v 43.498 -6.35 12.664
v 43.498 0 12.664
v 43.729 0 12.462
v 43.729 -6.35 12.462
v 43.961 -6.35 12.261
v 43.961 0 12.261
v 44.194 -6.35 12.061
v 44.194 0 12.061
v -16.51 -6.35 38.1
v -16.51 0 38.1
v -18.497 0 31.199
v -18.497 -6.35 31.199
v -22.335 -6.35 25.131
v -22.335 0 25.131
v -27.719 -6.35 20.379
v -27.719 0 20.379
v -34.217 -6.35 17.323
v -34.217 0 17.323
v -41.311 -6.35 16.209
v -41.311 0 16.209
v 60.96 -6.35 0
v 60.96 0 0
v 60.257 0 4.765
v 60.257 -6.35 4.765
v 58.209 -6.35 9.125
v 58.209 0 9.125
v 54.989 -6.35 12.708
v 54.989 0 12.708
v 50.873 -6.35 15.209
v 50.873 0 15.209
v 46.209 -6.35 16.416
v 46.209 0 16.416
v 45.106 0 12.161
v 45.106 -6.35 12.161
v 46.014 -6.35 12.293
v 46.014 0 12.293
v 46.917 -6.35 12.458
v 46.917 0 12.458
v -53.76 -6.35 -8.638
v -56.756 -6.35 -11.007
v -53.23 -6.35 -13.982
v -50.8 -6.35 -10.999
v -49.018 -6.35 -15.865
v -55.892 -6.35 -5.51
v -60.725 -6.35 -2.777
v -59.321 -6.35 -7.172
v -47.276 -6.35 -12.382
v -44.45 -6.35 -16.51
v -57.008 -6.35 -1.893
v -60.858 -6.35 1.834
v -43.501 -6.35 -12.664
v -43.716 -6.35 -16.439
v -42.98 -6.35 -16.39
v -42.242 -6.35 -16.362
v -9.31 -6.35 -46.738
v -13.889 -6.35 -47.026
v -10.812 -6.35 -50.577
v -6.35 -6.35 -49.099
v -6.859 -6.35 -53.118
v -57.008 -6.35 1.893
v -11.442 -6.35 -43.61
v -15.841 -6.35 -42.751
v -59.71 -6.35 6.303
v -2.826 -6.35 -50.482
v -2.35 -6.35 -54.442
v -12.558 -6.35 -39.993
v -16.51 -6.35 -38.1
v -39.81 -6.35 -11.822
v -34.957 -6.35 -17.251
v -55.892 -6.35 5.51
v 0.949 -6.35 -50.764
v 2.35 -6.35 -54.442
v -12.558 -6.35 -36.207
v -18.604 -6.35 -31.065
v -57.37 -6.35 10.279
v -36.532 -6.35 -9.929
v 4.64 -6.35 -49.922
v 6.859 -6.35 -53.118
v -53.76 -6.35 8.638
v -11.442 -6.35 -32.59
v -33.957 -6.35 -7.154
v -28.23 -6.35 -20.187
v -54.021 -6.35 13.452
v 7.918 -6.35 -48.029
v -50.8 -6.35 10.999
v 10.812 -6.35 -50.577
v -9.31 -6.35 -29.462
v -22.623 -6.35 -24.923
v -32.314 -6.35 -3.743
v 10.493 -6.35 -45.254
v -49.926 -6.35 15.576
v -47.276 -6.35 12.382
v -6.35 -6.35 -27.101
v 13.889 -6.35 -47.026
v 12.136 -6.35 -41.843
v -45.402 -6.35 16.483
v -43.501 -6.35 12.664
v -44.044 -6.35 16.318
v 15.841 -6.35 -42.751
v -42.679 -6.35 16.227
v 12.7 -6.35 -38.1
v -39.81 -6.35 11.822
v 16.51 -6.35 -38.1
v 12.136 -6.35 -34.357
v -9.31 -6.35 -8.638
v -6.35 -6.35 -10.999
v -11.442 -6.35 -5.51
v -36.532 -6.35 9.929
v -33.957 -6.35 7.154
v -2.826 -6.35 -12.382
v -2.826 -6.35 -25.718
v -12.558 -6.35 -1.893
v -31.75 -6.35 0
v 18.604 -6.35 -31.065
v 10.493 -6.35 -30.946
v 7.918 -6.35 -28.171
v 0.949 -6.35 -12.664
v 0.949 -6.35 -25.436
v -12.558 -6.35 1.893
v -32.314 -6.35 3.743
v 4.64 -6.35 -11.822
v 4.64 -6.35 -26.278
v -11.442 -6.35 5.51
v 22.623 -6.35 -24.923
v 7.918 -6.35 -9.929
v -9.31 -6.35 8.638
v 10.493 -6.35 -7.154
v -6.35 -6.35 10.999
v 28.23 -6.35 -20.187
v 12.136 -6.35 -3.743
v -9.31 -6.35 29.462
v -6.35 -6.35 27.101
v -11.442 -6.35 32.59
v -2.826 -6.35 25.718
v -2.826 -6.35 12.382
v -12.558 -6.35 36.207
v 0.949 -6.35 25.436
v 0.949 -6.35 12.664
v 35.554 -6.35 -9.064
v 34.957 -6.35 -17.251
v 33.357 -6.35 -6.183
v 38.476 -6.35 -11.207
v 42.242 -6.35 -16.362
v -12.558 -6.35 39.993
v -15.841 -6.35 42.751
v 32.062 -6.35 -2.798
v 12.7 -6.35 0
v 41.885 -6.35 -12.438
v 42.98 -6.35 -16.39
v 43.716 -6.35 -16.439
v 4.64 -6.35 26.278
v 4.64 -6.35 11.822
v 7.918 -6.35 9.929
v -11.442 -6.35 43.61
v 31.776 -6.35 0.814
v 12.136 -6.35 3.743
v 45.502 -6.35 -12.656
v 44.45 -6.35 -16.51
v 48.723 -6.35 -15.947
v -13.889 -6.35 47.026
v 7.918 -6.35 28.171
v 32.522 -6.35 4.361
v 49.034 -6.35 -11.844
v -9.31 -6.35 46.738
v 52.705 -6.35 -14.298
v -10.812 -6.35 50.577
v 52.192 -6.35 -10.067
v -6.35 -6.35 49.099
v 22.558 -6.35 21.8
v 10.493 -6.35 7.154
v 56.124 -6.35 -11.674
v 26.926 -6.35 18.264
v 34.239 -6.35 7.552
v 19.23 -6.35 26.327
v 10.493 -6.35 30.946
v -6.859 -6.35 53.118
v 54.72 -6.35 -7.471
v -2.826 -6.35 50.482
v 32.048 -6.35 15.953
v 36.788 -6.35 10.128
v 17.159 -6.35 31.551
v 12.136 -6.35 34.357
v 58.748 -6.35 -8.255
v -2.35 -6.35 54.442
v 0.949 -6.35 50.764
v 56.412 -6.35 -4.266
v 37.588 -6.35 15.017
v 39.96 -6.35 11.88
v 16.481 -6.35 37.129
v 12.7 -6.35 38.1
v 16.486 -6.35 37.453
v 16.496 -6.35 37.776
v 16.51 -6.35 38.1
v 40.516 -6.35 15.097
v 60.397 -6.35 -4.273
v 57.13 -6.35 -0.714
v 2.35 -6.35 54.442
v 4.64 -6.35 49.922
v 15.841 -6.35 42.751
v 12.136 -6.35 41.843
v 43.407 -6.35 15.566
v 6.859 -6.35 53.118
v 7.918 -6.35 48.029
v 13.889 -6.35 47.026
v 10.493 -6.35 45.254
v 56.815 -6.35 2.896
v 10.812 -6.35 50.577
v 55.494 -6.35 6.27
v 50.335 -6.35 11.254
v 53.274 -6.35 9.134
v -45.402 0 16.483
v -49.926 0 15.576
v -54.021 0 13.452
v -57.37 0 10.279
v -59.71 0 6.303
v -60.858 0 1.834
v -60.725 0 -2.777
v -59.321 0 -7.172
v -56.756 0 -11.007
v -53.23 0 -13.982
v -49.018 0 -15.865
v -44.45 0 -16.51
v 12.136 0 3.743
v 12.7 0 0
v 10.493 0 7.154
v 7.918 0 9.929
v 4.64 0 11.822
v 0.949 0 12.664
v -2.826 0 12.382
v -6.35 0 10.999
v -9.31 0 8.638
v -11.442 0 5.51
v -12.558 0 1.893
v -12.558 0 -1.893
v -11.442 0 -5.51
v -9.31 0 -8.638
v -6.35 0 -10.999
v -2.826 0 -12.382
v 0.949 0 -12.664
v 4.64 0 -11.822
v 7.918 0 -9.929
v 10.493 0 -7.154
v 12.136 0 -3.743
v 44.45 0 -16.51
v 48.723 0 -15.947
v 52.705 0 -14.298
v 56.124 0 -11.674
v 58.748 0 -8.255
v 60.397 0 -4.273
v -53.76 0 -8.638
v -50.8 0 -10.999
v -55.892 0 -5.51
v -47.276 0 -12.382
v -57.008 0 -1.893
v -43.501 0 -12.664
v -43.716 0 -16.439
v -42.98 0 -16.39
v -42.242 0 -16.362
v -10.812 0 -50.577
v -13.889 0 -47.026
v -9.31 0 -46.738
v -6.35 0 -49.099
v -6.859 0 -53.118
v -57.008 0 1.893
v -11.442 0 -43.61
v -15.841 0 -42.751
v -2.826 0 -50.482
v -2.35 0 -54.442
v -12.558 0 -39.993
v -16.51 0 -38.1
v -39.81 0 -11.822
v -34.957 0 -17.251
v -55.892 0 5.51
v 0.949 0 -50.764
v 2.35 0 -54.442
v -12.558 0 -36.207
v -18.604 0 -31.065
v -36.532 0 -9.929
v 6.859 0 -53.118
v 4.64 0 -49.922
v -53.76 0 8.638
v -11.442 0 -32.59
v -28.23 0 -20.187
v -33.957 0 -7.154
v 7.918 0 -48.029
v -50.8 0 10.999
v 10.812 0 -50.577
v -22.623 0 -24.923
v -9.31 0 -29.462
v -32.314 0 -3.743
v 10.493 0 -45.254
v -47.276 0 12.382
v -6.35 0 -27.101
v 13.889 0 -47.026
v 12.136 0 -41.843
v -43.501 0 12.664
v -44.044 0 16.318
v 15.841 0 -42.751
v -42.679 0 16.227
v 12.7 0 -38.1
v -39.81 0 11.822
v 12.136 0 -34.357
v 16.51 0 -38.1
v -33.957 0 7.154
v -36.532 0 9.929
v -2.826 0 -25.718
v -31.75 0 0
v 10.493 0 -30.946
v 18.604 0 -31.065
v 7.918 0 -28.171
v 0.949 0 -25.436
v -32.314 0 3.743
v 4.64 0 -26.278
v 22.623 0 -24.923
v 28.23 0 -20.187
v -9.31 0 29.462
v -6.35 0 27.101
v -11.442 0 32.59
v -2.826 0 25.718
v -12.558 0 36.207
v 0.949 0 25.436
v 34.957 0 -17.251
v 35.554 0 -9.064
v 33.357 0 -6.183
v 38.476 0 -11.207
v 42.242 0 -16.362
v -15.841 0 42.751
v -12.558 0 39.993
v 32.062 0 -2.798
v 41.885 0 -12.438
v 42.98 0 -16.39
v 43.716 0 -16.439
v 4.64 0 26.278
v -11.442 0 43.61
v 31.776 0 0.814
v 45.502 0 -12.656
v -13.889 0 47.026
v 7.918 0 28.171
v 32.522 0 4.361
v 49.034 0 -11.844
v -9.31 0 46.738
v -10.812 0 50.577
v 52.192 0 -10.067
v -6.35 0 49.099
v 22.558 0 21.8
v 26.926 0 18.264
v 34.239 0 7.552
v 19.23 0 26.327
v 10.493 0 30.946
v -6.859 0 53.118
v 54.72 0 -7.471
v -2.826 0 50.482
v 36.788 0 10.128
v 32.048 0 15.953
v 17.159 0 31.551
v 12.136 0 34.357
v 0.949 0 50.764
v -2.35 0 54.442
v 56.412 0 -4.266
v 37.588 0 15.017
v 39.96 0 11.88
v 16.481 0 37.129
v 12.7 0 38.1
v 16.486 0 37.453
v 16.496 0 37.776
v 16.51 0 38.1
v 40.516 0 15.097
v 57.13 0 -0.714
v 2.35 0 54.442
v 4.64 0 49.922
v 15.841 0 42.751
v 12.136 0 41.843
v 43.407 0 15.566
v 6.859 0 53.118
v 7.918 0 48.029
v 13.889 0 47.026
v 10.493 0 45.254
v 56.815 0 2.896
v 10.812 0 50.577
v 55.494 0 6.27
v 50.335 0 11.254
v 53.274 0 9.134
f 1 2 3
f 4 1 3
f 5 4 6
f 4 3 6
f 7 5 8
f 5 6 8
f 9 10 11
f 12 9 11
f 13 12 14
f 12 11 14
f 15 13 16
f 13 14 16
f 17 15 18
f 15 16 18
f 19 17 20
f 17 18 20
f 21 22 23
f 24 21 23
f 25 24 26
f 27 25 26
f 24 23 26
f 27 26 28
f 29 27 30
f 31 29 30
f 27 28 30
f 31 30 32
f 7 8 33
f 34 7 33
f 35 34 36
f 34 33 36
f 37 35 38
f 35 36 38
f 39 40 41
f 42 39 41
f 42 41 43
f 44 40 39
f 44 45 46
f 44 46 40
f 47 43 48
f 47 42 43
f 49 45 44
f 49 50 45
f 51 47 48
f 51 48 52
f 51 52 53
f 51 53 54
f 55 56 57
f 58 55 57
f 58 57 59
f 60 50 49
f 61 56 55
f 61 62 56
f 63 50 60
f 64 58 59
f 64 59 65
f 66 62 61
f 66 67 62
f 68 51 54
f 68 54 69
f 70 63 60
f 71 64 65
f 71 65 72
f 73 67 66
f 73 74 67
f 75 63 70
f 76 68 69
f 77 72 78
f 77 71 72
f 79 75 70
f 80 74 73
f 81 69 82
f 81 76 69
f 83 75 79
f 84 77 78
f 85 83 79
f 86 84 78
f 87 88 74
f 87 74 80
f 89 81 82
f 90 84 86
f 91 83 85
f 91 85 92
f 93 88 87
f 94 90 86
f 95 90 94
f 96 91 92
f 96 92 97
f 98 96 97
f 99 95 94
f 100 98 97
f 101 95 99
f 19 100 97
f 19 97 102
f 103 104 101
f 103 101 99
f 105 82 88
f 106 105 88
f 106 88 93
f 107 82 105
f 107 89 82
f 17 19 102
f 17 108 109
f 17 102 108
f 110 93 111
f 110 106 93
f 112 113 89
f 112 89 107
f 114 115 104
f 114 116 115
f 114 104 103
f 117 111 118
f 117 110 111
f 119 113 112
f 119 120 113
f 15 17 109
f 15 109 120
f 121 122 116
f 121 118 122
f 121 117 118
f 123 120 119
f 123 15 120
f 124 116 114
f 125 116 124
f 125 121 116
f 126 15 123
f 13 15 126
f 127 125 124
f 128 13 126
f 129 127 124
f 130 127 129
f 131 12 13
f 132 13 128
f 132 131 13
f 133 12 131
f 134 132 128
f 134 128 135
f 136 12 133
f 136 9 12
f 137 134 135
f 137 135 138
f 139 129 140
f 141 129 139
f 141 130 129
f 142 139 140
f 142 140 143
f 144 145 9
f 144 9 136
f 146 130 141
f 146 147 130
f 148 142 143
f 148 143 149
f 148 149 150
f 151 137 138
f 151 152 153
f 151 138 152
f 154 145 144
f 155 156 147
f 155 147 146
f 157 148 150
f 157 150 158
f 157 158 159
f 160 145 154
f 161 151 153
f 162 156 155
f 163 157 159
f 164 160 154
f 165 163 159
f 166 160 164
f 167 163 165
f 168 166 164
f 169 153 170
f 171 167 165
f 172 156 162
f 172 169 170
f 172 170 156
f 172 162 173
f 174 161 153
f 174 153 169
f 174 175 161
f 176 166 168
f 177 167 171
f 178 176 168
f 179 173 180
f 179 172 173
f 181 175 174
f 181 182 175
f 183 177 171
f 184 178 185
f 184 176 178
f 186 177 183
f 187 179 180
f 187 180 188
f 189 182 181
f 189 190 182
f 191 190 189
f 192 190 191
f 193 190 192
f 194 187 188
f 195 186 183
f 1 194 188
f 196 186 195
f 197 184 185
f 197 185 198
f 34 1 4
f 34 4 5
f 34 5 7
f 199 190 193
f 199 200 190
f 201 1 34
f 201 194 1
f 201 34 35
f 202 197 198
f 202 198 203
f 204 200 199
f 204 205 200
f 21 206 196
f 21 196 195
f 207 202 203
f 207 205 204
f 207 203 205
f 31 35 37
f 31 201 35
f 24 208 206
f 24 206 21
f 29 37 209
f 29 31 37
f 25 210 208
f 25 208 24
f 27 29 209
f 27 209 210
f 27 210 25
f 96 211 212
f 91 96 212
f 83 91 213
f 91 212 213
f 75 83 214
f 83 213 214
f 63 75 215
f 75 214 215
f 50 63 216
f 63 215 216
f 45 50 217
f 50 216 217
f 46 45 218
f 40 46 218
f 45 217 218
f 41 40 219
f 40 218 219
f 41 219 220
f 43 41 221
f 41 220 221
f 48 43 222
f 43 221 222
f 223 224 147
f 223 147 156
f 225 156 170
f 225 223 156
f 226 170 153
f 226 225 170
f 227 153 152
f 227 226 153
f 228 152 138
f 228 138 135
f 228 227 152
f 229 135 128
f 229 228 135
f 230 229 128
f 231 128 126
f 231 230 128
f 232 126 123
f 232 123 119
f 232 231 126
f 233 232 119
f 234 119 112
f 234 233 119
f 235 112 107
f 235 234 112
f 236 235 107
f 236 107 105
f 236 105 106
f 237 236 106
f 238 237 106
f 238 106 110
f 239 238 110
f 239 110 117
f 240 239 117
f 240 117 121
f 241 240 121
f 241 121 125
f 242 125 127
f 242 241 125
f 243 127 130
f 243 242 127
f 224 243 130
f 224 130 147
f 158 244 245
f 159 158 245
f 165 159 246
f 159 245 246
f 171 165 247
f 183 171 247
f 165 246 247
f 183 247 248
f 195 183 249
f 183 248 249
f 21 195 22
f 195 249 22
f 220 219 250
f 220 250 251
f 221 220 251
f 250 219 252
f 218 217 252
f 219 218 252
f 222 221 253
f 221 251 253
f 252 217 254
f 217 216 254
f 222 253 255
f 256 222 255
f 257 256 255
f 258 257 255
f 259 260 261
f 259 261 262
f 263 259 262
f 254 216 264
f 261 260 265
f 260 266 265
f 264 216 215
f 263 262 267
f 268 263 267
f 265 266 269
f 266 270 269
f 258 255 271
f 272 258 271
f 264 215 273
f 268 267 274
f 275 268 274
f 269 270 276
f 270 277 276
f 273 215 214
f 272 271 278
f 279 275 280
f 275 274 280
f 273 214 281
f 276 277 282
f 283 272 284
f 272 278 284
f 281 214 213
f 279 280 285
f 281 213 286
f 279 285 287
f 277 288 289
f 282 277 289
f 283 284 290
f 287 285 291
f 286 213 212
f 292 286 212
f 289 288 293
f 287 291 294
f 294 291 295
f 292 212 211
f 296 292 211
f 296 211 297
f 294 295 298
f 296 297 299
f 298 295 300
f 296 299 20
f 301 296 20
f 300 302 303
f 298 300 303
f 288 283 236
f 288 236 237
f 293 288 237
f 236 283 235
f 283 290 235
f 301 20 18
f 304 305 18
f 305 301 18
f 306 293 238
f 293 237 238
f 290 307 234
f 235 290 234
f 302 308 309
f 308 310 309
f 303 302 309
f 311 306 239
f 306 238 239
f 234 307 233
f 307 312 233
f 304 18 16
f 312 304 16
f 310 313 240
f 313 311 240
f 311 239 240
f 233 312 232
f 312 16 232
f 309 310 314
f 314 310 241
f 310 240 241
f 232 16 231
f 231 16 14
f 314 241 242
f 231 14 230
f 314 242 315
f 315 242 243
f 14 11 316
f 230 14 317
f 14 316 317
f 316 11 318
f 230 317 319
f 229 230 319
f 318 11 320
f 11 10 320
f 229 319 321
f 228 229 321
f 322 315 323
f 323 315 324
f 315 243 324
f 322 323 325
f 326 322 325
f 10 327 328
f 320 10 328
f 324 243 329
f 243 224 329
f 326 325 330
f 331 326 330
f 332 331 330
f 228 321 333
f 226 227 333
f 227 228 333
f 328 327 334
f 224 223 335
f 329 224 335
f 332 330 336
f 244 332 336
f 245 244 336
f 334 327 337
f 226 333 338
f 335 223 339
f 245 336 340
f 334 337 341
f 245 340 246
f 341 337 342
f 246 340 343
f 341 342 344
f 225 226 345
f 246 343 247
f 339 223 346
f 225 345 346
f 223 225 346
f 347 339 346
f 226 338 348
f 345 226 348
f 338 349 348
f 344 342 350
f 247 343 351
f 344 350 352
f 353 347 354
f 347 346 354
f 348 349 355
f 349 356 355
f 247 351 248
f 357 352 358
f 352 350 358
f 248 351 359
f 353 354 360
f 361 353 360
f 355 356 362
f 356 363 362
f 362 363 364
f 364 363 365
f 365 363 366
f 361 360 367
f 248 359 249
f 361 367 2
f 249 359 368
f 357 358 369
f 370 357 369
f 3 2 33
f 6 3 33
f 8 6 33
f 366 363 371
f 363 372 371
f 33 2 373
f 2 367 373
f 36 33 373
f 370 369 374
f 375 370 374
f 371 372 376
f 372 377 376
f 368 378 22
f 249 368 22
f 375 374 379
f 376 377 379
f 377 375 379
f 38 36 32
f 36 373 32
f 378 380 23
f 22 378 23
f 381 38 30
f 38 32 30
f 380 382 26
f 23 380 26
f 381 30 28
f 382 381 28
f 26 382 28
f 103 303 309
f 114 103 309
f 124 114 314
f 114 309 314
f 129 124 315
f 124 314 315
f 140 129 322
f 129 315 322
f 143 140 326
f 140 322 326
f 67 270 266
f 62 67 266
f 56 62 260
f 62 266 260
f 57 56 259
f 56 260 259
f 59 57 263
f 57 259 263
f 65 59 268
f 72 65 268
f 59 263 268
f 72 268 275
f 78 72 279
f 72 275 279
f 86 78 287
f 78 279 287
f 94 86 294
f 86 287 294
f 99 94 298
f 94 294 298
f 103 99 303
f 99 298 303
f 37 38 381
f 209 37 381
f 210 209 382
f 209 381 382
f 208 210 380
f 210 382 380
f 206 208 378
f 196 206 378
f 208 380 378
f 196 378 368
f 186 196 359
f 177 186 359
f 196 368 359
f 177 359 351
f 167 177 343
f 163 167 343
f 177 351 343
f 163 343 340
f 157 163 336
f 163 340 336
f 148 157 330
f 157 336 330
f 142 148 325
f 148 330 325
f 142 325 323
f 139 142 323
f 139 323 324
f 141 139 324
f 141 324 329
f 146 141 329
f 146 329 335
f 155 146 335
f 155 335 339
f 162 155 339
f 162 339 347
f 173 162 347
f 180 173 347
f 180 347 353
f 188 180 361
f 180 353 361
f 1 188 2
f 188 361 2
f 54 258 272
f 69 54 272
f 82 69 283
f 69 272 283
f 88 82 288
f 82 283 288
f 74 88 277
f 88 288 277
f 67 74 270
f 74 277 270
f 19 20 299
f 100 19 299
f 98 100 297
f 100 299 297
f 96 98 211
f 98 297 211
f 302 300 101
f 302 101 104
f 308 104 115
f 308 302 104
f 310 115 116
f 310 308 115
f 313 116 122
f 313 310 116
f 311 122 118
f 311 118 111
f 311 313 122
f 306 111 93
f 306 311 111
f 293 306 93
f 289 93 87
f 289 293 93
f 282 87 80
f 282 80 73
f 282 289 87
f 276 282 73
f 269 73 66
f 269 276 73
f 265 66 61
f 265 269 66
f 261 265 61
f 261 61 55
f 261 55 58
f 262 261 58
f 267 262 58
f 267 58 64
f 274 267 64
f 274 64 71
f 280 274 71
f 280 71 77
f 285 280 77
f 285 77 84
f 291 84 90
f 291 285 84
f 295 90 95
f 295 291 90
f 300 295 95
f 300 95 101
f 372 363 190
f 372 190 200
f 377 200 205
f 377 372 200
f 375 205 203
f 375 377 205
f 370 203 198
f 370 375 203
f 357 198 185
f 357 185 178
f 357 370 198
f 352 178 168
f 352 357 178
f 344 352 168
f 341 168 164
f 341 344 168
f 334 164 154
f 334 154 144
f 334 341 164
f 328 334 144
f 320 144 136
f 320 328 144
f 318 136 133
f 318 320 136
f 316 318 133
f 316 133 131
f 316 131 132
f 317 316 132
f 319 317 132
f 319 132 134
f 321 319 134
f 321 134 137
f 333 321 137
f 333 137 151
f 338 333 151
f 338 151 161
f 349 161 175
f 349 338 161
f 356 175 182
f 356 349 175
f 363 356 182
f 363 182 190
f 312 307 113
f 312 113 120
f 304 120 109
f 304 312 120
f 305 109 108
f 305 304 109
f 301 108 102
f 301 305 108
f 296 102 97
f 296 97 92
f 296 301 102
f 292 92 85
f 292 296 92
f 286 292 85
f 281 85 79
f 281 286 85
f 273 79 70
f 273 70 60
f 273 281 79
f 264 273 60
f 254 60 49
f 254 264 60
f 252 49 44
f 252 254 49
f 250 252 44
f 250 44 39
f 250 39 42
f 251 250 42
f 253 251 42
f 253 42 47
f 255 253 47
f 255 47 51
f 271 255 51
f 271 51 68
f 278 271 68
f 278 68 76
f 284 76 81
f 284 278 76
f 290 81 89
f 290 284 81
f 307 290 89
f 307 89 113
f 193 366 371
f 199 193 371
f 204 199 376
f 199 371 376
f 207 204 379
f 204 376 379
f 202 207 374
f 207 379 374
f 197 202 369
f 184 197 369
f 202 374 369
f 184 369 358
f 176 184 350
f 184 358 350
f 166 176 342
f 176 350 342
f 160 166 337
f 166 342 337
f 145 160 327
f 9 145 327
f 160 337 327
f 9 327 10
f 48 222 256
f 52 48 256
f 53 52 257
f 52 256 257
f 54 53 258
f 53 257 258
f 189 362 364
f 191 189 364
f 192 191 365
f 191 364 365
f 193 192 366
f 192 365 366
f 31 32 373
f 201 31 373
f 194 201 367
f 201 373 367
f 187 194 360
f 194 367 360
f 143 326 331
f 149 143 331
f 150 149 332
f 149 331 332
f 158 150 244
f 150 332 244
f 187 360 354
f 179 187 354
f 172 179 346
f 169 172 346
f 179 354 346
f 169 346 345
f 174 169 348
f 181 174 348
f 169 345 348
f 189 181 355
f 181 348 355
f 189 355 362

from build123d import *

# Parameters (mm, degrees)
F0_R     = 12.7
F1_DEPTH = 6.35


# Not quite as in the source:
# - a feature names something its author has since deleted; it is built from what else it names


with BuildPart() as f1:
    # F0 (on Front) → F1 (new body)
    with BuildSketch(Plane.XZ):
        with BuildLine():
            ThreePointArc((16.4814082308, 37.1287725662), (16.4903338535, 37.6145443772), (16.51, 38.1))
            ThreePointArc((16.51, 38.1), (0, 54.61), (-16.51, 38.1))
            ThreePointArc((-16.51, 38.1), (-0.4858240981, 21.5971494903), (16.4814082308, 37.1287725662))
        make_face()
        with Locations((0, 38.1)):
            Circle(F0_R, mode=Mode.SUBTRACT)
        with BuildLine():
            ThreePointArc((16.4814082308, 37.1287725662), (-0.4858240981, 21.5971494903), (-16.51, 38.1))
            ThreePointArc((-16.51, 38.1), (-24.8582581267, 22.5634685942), (-41.3111088486, 16.2088698662))
            ThreePointArc((-41.3111088486, 16.2088698662), (-31.7141609442, 10.5061174344), (-27.94, 0))
            ThreePointArc((-27.94, 0), (-32.0196049569, -10.8657893902), (-42.2422869864, -16.3617267808))
            ThreePointArc((-42.2422869864, -16.3617267808), (-25.2542323654, -22.3516257894), (-16.51, -38.1))
            ThreePointArc((-16.51, -38.1), (0, -21.59), (16.51, -38.1))
            ThreePointArc((16.51, -38.1), (25.2542323654, -22.3516257894), (42.2422869864, -16.3617267808))
            ThreePointArc((42.2422869864, -16.3617267808), (28.118646251, -2.4221859395), (37.5884063644, 15.0166118942))
            ThreePointArc((37.5884063644, 15.0166118942), (22.5582227264, 21.7995063444), (16.4814082308, 37.1287725662))
        make_face()
        Circle(F0_R, mode=Mode.SUBTRACT)
        with BuildLine():
            ThreePointArc((-27.94, 0), (-31.7141609442, 10.5061174344), (-41.3111088486, 16.2088698662))
            ThreePointArc((-41.3111088486, 16.2088698662), (-43.3621139683, 16.2630178255), (-45.4020575599, 16.4825266996))
            ThreePointArc((-45.4020575599, 16.4825266996), (-60.9531302457, -0.4762269364), (-44.45, -16.51))
            ThreePointArc((-44.45, -16.51), (-43.3477588373, -16.4118117369), (-42.2422869864, -16.3617267808))
            ThreePointArc((-42.2422869864, -16.3617267808), (-32.0196049569, -10.8657893902), (-27.94, 0))
        make_face()
        with Locations((-44.45, 0)):
            Circle(F0_R, mode=Mode.SUBTRACT)
        with BuildLine():
            ThreePointArc((46.209319854, 16.4159950552), (41.9691064238, 15.2835688562), (37.5884063644, 15.0166118942))
            ThreePointArc((37.5884063644, 15.0166118942), (28.118646251, -2.4221859395), (42.2422869864, -16.3617267808))
            ThreePointArc((42.2422869864, -16.3617267808), (43.3477588373, -16.4118117369), (44.45, -16.51))
            ThreePointArc((44.45, -16.51), (56.1243329574, -11.6743329574), (60.96, 0))
            ThreePointArc((60.96, 0), (56.7306040322, 11.0348024271), (46.209319854, 16.4159950552))
        make_face()
        with BuildLine():
            ThreePointArc((46.9166774243, 12.4581500426), (43.685710075, -12.6769815378), (43.4979424401, 12.6642641477))
            ThreePointArc((43.4979424401, 12.6642641477), (43.8445127875, 12.3613055932), (44.1938141149, 12.0614998657))
            ThreePointArc((44.1938141149, 12.0614998657), (45.5606208941, 12.2229266237), (46.9166774243, 12.4581500426))
        make_face(mode=Mode.SUBTRACT)
        with BuildLine():
            ThreePointArc((-16.51, -38.1), (0, -54.61), (16.51, -38.1))
            ThreePointArc((16.51, -38.1), (0, -21.59), (-16.51, -38.1))
        make_face()
        with Locations((0, -38.1)):
            Circle(F0_R, mode=Mode.SUBTRACT)
    extrude(amount=F1_DEPTH)


solid = f1.part
